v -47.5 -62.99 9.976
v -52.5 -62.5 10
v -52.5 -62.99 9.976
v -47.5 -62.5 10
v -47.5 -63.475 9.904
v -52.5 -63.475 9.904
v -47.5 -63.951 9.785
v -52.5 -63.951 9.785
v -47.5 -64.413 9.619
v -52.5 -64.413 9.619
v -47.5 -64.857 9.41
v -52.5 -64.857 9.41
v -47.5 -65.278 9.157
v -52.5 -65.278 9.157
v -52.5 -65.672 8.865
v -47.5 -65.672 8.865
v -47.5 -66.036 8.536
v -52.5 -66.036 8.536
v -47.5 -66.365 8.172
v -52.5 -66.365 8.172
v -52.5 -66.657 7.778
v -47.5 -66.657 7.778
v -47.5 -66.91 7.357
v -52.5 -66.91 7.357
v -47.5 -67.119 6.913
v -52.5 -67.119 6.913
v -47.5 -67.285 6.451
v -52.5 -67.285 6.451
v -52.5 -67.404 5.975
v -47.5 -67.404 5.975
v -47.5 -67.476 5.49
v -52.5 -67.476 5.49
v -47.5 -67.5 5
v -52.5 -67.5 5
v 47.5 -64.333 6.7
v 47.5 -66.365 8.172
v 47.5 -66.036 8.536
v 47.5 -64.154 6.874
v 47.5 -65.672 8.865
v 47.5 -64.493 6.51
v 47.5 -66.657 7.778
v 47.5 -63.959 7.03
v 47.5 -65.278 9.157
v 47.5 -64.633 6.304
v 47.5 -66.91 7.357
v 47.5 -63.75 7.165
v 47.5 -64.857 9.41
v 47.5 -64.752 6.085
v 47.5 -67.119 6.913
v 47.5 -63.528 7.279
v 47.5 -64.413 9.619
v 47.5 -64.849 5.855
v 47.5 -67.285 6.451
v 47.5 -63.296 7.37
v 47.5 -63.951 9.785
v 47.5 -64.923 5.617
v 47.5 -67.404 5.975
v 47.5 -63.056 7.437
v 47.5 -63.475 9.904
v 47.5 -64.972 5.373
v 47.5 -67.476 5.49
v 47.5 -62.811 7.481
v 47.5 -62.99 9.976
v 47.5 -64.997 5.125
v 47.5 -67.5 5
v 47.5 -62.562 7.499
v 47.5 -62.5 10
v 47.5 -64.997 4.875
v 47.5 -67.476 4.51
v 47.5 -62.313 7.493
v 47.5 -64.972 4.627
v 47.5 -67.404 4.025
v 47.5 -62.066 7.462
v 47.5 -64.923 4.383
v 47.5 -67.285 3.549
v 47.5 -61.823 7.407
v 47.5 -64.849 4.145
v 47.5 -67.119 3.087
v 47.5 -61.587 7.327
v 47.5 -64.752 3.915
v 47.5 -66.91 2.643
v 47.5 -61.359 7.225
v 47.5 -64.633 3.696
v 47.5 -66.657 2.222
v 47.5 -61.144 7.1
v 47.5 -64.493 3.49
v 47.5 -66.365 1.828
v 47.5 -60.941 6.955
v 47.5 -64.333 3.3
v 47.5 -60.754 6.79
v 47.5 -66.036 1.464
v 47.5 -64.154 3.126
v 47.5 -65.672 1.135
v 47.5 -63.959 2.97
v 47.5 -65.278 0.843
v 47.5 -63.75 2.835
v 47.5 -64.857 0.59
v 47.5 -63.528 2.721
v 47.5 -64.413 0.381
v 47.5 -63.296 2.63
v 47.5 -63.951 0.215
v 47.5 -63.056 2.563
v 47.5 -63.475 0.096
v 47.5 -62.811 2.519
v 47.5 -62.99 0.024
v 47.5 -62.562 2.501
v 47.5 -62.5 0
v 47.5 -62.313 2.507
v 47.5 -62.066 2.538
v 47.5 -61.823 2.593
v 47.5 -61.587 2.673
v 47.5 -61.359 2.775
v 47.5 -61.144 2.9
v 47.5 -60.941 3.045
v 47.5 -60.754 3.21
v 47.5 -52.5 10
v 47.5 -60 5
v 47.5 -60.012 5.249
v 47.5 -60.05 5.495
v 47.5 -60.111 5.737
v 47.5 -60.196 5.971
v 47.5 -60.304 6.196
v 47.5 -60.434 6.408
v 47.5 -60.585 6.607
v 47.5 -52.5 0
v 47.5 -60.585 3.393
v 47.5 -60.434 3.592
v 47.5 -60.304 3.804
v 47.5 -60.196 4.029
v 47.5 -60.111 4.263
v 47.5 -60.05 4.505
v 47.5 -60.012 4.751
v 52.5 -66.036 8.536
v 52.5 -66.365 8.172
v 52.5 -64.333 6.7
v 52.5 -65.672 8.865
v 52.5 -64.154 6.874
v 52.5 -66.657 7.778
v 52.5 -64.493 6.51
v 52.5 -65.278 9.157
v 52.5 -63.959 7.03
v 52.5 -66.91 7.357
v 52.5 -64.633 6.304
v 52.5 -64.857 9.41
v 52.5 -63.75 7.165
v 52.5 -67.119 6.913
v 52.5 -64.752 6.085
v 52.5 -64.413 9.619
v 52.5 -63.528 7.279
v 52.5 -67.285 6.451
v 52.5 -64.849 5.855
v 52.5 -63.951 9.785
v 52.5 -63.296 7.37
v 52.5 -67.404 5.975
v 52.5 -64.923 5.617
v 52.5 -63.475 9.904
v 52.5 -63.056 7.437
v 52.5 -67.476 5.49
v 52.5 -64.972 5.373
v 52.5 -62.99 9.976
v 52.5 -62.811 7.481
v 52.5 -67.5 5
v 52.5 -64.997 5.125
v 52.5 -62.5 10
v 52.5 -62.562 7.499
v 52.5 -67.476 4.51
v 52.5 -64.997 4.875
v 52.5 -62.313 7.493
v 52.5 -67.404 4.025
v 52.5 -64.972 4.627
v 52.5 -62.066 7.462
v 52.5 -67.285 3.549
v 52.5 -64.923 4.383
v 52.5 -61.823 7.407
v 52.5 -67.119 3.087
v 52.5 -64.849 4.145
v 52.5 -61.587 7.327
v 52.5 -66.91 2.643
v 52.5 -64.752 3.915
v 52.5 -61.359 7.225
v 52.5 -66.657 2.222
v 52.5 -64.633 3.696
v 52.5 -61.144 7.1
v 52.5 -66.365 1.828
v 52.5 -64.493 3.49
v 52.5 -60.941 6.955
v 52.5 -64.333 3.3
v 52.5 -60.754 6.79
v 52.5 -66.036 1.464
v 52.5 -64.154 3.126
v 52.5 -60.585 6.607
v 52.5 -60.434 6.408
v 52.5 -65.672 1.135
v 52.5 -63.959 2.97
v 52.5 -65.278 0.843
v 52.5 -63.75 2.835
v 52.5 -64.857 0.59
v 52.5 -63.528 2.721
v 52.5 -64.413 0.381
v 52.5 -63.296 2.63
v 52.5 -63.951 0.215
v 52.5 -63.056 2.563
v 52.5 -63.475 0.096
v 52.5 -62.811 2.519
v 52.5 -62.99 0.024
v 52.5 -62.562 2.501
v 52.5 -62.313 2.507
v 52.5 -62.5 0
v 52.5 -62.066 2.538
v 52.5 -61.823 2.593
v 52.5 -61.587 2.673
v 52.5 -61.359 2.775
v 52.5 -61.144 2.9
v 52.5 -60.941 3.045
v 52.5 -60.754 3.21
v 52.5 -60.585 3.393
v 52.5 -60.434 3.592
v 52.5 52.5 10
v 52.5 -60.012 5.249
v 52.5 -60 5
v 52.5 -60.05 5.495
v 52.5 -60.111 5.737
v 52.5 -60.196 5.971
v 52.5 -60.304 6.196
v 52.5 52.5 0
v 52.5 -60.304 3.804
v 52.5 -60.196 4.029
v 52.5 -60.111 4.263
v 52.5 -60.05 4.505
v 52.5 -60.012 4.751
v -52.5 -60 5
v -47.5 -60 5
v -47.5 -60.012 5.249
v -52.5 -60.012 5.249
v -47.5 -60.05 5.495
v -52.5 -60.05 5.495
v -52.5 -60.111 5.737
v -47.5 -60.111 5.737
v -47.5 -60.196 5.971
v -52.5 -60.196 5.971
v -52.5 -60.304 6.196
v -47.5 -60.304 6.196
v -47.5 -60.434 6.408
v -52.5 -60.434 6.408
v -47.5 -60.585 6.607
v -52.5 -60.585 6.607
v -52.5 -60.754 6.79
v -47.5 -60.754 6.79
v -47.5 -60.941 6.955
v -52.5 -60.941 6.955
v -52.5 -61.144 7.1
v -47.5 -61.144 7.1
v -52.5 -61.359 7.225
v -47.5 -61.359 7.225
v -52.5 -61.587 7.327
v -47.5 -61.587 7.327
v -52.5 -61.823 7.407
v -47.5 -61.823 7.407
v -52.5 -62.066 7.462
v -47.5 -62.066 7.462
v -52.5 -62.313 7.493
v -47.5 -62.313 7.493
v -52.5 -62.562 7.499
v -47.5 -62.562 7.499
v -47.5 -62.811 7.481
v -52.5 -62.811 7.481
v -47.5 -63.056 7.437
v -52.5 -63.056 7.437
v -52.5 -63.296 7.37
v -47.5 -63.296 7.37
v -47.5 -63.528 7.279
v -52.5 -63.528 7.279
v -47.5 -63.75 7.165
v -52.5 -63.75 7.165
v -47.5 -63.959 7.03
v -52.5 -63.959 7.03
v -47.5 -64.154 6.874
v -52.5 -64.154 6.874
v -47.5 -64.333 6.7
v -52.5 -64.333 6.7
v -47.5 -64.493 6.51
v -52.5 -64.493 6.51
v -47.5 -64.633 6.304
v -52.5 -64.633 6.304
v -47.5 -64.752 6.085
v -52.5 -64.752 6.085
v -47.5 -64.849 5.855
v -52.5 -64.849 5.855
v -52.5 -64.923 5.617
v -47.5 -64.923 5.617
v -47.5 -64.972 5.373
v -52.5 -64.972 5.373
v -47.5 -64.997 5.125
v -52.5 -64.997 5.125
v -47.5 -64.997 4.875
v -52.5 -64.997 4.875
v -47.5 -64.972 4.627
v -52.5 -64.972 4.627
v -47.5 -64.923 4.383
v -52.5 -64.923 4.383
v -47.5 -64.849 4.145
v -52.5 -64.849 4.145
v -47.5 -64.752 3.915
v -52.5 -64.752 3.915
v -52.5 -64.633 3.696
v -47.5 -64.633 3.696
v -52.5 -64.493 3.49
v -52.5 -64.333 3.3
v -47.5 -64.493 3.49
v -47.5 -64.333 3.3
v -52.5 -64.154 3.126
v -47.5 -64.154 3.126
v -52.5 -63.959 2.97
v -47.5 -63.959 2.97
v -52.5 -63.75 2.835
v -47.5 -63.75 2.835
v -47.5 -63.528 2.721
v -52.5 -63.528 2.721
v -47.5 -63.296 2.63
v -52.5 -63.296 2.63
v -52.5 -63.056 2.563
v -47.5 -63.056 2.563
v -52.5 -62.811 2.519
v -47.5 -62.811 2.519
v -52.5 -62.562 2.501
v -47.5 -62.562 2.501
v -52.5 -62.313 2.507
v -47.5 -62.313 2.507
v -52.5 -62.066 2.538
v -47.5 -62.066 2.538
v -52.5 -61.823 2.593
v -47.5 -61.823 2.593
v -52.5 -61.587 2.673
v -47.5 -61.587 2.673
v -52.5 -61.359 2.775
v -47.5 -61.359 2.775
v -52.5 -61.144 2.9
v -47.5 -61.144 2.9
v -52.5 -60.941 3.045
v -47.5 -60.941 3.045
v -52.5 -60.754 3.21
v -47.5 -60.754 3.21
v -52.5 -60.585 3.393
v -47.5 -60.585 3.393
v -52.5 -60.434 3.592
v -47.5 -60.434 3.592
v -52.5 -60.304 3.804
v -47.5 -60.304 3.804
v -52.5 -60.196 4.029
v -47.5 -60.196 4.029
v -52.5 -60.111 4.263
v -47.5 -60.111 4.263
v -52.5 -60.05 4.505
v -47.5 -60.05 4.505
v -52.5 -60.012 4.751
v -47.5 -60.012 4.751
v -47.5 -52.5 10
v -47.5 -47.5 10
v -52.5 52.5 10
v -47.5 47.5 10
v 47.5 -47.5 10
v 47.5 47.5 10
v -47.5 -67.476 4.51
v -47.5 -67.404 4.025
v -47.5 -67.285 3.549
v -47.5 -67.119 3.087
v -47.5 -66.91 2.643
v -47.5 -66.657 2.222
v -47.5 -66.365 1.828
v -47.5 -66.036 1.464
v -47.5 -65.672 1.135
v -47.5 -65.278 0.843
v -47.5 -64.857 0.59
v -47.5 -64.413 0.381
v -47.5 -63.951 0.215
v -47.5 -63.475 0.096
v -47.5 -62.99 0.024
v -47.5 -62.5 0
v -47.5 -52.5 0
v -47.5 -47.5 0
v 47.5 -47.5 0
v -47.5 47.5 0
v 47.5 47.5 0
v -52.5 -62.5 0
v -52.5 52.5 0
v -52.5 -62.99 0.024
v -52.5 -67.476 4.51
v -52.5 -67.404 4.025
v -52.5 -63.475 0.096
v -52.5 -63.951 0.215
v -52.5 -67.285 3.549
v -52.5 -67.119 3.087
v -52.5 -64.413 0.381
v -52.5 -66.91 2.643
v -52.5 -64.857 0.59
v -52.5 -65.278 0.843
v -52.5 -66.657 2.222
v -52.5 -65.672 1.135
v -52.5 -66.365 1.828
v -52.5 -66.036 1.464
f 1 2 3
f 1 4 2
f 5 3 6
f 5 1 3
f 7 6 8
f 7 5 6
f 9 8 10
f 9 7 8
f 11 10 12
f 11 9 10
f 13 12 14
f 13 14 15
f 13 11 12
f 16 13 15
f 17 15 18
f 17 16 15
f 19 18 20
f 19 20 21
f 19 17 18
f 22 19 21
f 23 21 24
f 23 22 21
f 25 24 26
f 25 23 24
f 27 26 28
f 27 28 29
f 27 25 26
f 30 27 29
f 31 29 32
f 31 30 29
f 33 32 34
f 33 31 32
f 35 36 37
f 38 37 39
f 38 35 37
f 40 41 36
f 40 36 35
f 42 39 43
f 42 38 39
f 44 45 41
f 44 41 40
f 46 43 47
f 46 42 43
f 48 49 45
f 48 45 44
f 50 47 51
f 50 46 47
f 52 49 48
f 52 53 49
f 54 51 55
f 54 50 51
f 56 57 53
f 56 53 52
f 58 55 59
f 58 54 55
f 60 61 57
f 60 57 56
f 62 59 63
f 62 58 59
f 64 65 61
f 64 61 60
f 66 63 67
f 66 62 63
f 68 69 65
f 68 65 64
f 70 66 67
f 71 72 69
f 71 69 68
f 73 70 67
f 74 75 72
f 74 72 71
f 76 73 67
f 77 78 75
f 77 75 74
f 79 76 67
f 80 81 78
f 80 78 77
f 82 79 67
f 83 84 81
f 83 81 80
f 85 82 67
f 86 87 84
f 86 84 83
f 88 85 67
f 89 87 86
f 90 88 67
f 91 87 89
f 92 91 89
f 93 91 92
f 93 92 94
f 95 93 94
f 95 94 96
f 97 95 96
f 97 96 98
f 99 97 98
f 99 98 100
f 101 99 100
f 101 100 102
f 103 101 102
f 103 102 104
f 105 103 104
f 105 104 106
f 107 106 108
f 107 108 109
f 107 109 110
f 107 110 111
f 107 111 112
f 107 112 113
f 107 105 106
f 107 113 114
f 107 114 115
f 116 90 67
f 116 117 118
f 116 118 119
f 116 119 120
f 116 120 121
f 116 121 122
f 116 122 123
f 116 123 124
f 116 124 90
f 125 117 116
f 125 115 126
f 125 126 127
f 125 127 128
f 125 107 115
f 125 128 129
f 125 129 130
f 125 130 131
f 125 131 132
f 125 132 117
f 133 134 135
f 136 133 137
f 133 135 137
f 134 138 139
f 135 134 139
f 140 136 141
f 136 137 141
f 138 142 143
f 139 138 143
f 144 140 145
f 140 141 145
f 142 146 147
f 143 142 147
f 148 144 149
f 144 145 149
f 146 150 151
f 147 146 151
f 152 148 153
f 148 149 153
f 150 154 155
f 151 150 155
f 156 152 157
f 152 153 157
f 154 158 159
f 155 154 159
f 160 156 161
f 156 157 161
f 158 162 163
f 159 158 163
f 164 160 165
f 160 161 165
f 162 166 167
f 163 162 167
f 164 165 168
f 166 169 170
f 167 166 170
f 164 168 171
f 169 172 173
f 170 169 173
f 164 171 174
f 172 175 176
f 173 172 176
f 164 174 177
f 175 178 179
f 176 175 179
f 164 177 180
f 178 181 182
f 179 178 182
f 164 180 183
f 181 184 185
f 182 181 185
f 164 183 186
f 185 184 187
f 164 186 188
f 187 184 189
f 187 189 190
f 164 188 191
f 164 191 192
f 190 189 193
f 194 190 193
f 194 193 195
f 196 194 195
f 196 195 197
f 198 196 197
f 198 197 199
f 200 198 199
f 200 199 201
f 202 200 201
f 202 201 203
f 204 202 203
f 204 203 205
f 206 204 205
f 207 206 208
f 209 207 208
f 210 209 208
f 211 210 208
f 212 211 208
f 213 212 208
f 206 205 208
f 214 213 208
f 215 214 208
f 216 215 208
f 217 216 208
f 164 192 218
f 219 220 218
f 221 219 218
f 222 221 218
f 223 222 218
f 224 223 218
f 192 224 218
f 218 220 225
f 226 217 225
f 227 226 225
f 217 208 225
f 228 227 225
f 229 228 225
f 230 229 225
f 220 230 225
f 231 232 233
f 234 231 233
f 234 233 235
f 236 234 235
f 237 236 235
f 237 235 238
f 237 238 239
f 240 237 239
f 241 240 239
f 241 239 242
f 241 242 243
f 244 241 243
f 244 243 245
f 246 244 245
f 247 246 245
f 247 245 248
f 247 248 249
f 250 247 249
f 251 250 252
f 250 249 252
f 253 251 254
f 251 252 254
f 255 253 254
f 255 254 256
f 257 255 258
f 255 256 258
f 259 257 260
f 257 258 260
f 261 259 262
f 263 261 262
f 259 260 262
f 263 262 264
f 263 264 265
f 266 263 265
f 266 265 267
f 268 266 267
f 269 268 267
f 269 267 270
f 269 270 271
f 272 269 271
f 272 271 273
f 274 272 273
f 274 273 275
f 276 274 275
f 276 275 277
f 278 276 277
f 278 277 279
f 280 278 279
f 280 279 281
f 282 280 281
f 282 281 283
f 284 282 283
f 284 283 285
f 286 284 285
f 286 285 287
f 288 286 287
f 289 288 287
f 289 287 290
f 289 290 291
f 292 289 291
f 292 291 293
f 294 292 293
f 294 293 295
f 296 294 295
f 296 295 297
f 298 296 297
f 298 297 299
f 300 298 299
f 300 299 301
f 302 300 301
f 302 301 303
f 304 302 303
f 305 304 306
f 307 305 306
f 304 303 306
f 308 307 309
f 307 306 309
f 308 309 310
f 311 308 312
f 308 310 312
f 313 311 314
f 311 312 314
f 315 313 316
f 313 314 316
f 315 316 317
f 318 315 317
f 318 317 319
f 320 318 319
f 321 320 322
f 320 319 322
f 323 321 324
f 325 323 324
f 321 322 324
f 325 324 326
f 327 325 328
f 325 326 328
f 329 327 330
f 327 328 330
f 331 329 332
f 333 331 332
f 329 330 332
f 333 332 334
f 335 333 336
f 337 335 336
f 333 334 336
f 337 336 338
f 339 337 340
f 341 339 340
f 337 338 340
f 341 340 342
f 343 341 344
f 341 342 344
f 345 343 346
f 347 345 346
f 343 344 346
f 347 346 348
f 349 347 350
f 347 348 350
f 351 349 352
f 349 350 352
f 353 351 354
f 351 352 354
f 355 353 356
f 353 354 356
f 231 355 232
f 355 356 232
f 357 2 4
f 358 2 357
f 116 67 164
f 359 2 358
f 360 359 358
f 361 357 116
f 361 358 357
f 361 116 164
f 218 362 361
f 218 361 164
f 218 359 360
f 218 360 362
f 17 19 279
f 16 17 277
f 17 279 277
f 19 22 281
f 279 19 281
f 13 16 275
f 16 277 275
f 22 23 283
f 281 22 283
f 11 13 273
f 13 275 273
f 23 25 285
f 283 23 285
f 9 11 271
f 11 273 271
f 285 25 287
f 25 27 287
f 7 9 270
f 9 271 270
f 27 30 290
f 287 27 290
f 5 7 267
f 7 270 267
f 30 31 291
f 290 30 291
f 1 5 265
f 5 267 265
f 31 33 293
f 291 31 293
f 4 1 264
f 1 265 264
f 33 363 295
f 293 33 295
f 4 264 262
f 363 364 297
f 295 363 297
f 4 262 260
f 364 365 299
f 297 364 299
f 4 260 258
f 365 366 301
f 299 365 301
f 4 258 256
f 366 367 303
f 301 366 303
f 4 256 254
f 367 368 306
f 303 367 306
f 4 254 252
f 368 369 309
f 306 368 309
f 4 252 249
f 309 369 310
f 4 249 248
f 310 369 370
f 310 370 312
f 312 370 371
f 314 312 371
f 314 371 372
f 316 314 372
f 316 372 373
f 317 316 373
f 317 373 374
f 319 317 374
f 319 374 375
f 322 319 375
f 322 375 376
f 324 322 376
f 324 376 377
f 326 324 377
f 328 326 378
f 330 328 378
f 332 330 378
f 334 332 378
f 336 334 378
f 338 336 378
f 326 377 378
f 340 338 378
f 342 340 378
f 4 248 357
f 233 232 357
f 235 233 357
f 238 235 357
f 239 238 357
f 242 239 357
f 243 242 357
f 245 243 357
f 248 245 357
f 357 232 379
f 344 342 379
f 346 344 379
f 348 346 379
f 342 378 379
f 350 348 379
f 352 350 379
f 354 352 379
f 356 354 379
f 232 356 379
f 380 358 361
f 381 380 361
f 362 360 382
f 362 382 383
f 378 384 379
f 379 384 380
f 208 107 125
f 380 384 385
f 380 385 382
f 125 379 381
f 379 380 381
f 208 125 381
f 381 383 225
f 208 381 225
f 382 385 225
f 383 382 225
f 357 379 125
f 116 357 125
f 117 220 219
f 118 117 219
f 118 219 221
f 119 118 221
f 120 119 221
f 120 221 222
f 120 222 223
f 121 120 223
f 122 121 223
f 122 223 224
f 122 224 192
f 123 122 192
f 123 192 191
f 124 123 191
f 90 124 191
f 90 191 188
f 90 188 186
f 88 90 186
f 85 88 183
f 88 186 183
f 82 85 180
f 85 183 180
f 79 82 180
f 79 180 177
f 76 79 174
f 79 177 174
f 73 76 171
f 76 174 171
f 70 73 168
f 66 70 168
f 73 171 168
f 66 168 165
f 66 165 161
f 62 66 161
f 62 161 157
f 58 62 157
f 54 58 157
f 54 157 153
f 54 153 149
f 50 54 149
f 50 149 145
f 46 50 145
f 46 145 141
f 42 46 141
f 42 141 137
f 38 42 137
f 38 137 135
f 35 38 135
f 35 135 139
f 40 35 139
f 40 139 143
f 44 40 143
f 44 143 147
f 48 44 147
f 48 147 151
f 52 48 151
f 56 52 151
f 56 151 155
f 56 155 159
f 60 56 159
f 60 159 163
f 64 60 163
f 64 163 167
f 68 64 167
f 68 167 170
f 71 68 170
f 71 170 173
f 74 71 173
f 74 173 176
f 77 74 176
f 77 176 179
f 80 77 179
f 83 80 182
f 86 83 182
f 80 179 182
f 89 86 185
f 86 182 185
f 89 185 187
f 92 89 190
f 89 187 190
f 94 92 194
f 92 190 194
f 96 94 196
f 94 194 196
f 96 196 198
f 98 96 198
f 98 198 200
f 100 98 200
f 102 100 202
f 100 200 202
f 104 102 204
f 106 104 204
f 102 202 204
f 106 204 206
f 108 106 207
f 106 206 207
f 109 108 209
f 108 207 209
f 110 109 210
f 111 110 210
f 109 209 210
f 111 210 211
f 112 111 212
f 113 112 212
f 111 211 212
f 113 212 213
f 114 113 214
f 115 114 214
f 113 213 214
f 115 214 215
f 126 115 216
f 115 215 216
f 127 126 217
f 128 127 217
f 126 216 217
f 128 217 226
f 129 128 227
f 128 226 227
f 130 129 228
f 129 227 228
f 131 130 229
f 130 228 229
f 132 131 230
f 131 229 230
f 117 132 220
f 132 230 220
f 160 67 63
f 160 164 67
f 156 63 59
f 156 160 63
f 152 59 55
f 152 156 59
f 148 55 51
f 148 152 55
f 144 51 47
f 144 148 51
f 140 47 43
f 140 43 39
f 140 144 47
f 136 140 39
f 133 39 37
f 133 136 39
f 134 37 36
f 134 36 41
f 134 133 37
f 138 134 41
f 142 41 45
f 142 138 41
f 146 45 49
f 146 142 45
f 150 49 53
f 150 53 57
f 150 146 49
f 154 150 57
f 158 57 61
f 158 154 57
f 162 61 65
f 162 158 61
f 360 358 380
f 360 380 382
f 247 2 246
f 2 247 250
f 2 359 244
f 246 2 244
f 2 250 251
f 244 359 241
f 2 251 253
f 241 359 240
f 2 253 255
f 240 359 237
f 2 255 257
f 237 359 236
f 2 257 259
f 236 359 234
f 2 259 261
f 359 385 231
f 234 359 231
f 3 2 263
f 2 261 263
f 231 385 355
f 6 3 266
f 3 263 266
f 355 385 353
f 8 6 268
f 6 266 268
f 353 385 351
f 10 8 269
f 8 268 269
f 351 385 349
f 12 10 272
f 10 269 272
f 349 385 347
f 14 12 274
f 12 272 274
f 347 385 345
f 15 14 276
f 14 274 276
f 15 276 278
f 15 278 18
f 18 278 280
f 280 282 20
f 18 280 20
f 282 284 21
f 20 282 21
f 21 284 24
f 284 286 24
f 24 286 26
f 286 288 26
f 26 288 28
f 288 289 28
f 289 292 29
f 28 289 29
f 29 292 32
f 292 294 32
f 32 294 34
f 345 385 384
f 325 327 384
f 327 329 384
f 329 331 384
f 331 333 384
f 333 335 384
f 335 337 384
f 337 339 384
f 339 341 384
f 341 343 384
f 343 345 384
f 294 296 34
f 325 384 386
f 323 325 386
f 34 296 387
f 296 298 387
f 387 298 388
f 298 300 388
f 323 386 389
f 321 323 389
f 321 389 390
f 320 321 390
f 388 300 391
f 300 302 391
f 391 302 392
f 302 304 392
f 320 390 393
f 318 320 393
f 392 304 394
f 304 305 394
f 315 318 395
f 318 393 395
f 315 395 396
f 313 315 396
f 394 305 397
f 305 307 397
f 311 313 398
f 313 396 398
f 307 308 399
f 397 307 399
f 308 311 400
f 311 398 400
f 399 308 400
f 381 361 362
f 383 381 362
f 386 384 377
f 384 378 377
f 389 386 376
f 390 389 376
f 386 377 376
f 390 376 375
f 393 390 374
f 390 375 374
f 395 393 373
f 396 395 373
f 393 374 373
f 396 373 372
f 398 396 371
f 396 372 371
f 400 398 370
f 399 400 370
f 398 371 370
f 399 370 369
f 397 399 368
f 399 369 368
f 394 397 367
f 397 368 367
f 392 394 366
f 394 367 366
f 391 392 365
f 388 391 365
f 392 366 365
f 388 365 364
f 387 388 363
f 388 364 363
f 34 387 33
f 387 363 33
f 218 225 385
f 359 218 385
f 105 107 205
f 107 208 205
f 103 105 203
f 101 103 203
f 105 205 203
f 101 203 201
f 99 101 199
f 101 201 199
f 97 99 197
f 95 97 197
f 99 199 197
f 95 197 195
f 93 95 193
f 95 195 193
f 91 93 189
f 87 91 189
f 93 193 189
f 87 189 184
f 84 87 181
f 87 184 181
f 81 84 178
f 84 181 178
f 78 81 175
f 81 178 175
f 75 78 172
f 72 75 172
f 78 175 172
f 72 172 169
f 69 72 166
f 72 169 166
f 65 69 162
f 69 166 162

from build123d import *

# Parameters (mm, degrees)
F0_W     = 5
F0_H     = 15
F1_DEPTH = 10
F2_R     = 2.5
F3_DEPTH = 105.001
F4_R     = 4.99999
F5_W     = 95
F5_H     = 95
F6_DEPTH = 10.001


# Not quite as in the source:
# - a fillet or chamfer is up to 0.001 mm smaller than in the source, because OpenCascade refuses the exact size


with BuildPart() as f1:
    # F0 (on Top) → F1 (new body)
    with BuildSketch(Plane.XY):
        Polygon((52.5, 52.5), (-52.5, 52.5), (-52.5, -52.5), (-47.5, -52.5), (47.5, -52.5), (52.5, -52.5), align=None)
        with Locations((-50, -60)):
            Rectangle(F0_W, F0_H)
        with Locations((50, -60)):
            Rectangle(F0_W, F0_H)
    extrude(amount=F1_DEPTH)

    # F2 (on face) → F3 (cut, through all)
    with BuildSketch(Plane.YZ.offset(52.5)):
        with Locations((-62.5, 5)):
            Circle(F2_R)
    extrude(amount=-F3_DEPTH, mode=Mode.SUBTRACT)

    # F4 (radius 5 in the source; OpenCascade refuses exactly that, so slightly less here)
    f4_edges = [f1.edges().sort_by_distance(p)[0] for p in [
        (-50, -67.5, 10),
        (-50, -67.5, 0),
        (50, -67.5, 10),
        (50, -67.5, 0),
    ]]
    fillet(f4_edges, radius=F4_R)

    # F5 (on face) → F6 (cut, through all)
    with BuildSketch(Plane.XY.offset(10)):
        Rectangle(F5_W, F5_H)
    extrude(amount=-F6_DEPTH, mode=Mode.SUBTRACT)


solid = f1.part
